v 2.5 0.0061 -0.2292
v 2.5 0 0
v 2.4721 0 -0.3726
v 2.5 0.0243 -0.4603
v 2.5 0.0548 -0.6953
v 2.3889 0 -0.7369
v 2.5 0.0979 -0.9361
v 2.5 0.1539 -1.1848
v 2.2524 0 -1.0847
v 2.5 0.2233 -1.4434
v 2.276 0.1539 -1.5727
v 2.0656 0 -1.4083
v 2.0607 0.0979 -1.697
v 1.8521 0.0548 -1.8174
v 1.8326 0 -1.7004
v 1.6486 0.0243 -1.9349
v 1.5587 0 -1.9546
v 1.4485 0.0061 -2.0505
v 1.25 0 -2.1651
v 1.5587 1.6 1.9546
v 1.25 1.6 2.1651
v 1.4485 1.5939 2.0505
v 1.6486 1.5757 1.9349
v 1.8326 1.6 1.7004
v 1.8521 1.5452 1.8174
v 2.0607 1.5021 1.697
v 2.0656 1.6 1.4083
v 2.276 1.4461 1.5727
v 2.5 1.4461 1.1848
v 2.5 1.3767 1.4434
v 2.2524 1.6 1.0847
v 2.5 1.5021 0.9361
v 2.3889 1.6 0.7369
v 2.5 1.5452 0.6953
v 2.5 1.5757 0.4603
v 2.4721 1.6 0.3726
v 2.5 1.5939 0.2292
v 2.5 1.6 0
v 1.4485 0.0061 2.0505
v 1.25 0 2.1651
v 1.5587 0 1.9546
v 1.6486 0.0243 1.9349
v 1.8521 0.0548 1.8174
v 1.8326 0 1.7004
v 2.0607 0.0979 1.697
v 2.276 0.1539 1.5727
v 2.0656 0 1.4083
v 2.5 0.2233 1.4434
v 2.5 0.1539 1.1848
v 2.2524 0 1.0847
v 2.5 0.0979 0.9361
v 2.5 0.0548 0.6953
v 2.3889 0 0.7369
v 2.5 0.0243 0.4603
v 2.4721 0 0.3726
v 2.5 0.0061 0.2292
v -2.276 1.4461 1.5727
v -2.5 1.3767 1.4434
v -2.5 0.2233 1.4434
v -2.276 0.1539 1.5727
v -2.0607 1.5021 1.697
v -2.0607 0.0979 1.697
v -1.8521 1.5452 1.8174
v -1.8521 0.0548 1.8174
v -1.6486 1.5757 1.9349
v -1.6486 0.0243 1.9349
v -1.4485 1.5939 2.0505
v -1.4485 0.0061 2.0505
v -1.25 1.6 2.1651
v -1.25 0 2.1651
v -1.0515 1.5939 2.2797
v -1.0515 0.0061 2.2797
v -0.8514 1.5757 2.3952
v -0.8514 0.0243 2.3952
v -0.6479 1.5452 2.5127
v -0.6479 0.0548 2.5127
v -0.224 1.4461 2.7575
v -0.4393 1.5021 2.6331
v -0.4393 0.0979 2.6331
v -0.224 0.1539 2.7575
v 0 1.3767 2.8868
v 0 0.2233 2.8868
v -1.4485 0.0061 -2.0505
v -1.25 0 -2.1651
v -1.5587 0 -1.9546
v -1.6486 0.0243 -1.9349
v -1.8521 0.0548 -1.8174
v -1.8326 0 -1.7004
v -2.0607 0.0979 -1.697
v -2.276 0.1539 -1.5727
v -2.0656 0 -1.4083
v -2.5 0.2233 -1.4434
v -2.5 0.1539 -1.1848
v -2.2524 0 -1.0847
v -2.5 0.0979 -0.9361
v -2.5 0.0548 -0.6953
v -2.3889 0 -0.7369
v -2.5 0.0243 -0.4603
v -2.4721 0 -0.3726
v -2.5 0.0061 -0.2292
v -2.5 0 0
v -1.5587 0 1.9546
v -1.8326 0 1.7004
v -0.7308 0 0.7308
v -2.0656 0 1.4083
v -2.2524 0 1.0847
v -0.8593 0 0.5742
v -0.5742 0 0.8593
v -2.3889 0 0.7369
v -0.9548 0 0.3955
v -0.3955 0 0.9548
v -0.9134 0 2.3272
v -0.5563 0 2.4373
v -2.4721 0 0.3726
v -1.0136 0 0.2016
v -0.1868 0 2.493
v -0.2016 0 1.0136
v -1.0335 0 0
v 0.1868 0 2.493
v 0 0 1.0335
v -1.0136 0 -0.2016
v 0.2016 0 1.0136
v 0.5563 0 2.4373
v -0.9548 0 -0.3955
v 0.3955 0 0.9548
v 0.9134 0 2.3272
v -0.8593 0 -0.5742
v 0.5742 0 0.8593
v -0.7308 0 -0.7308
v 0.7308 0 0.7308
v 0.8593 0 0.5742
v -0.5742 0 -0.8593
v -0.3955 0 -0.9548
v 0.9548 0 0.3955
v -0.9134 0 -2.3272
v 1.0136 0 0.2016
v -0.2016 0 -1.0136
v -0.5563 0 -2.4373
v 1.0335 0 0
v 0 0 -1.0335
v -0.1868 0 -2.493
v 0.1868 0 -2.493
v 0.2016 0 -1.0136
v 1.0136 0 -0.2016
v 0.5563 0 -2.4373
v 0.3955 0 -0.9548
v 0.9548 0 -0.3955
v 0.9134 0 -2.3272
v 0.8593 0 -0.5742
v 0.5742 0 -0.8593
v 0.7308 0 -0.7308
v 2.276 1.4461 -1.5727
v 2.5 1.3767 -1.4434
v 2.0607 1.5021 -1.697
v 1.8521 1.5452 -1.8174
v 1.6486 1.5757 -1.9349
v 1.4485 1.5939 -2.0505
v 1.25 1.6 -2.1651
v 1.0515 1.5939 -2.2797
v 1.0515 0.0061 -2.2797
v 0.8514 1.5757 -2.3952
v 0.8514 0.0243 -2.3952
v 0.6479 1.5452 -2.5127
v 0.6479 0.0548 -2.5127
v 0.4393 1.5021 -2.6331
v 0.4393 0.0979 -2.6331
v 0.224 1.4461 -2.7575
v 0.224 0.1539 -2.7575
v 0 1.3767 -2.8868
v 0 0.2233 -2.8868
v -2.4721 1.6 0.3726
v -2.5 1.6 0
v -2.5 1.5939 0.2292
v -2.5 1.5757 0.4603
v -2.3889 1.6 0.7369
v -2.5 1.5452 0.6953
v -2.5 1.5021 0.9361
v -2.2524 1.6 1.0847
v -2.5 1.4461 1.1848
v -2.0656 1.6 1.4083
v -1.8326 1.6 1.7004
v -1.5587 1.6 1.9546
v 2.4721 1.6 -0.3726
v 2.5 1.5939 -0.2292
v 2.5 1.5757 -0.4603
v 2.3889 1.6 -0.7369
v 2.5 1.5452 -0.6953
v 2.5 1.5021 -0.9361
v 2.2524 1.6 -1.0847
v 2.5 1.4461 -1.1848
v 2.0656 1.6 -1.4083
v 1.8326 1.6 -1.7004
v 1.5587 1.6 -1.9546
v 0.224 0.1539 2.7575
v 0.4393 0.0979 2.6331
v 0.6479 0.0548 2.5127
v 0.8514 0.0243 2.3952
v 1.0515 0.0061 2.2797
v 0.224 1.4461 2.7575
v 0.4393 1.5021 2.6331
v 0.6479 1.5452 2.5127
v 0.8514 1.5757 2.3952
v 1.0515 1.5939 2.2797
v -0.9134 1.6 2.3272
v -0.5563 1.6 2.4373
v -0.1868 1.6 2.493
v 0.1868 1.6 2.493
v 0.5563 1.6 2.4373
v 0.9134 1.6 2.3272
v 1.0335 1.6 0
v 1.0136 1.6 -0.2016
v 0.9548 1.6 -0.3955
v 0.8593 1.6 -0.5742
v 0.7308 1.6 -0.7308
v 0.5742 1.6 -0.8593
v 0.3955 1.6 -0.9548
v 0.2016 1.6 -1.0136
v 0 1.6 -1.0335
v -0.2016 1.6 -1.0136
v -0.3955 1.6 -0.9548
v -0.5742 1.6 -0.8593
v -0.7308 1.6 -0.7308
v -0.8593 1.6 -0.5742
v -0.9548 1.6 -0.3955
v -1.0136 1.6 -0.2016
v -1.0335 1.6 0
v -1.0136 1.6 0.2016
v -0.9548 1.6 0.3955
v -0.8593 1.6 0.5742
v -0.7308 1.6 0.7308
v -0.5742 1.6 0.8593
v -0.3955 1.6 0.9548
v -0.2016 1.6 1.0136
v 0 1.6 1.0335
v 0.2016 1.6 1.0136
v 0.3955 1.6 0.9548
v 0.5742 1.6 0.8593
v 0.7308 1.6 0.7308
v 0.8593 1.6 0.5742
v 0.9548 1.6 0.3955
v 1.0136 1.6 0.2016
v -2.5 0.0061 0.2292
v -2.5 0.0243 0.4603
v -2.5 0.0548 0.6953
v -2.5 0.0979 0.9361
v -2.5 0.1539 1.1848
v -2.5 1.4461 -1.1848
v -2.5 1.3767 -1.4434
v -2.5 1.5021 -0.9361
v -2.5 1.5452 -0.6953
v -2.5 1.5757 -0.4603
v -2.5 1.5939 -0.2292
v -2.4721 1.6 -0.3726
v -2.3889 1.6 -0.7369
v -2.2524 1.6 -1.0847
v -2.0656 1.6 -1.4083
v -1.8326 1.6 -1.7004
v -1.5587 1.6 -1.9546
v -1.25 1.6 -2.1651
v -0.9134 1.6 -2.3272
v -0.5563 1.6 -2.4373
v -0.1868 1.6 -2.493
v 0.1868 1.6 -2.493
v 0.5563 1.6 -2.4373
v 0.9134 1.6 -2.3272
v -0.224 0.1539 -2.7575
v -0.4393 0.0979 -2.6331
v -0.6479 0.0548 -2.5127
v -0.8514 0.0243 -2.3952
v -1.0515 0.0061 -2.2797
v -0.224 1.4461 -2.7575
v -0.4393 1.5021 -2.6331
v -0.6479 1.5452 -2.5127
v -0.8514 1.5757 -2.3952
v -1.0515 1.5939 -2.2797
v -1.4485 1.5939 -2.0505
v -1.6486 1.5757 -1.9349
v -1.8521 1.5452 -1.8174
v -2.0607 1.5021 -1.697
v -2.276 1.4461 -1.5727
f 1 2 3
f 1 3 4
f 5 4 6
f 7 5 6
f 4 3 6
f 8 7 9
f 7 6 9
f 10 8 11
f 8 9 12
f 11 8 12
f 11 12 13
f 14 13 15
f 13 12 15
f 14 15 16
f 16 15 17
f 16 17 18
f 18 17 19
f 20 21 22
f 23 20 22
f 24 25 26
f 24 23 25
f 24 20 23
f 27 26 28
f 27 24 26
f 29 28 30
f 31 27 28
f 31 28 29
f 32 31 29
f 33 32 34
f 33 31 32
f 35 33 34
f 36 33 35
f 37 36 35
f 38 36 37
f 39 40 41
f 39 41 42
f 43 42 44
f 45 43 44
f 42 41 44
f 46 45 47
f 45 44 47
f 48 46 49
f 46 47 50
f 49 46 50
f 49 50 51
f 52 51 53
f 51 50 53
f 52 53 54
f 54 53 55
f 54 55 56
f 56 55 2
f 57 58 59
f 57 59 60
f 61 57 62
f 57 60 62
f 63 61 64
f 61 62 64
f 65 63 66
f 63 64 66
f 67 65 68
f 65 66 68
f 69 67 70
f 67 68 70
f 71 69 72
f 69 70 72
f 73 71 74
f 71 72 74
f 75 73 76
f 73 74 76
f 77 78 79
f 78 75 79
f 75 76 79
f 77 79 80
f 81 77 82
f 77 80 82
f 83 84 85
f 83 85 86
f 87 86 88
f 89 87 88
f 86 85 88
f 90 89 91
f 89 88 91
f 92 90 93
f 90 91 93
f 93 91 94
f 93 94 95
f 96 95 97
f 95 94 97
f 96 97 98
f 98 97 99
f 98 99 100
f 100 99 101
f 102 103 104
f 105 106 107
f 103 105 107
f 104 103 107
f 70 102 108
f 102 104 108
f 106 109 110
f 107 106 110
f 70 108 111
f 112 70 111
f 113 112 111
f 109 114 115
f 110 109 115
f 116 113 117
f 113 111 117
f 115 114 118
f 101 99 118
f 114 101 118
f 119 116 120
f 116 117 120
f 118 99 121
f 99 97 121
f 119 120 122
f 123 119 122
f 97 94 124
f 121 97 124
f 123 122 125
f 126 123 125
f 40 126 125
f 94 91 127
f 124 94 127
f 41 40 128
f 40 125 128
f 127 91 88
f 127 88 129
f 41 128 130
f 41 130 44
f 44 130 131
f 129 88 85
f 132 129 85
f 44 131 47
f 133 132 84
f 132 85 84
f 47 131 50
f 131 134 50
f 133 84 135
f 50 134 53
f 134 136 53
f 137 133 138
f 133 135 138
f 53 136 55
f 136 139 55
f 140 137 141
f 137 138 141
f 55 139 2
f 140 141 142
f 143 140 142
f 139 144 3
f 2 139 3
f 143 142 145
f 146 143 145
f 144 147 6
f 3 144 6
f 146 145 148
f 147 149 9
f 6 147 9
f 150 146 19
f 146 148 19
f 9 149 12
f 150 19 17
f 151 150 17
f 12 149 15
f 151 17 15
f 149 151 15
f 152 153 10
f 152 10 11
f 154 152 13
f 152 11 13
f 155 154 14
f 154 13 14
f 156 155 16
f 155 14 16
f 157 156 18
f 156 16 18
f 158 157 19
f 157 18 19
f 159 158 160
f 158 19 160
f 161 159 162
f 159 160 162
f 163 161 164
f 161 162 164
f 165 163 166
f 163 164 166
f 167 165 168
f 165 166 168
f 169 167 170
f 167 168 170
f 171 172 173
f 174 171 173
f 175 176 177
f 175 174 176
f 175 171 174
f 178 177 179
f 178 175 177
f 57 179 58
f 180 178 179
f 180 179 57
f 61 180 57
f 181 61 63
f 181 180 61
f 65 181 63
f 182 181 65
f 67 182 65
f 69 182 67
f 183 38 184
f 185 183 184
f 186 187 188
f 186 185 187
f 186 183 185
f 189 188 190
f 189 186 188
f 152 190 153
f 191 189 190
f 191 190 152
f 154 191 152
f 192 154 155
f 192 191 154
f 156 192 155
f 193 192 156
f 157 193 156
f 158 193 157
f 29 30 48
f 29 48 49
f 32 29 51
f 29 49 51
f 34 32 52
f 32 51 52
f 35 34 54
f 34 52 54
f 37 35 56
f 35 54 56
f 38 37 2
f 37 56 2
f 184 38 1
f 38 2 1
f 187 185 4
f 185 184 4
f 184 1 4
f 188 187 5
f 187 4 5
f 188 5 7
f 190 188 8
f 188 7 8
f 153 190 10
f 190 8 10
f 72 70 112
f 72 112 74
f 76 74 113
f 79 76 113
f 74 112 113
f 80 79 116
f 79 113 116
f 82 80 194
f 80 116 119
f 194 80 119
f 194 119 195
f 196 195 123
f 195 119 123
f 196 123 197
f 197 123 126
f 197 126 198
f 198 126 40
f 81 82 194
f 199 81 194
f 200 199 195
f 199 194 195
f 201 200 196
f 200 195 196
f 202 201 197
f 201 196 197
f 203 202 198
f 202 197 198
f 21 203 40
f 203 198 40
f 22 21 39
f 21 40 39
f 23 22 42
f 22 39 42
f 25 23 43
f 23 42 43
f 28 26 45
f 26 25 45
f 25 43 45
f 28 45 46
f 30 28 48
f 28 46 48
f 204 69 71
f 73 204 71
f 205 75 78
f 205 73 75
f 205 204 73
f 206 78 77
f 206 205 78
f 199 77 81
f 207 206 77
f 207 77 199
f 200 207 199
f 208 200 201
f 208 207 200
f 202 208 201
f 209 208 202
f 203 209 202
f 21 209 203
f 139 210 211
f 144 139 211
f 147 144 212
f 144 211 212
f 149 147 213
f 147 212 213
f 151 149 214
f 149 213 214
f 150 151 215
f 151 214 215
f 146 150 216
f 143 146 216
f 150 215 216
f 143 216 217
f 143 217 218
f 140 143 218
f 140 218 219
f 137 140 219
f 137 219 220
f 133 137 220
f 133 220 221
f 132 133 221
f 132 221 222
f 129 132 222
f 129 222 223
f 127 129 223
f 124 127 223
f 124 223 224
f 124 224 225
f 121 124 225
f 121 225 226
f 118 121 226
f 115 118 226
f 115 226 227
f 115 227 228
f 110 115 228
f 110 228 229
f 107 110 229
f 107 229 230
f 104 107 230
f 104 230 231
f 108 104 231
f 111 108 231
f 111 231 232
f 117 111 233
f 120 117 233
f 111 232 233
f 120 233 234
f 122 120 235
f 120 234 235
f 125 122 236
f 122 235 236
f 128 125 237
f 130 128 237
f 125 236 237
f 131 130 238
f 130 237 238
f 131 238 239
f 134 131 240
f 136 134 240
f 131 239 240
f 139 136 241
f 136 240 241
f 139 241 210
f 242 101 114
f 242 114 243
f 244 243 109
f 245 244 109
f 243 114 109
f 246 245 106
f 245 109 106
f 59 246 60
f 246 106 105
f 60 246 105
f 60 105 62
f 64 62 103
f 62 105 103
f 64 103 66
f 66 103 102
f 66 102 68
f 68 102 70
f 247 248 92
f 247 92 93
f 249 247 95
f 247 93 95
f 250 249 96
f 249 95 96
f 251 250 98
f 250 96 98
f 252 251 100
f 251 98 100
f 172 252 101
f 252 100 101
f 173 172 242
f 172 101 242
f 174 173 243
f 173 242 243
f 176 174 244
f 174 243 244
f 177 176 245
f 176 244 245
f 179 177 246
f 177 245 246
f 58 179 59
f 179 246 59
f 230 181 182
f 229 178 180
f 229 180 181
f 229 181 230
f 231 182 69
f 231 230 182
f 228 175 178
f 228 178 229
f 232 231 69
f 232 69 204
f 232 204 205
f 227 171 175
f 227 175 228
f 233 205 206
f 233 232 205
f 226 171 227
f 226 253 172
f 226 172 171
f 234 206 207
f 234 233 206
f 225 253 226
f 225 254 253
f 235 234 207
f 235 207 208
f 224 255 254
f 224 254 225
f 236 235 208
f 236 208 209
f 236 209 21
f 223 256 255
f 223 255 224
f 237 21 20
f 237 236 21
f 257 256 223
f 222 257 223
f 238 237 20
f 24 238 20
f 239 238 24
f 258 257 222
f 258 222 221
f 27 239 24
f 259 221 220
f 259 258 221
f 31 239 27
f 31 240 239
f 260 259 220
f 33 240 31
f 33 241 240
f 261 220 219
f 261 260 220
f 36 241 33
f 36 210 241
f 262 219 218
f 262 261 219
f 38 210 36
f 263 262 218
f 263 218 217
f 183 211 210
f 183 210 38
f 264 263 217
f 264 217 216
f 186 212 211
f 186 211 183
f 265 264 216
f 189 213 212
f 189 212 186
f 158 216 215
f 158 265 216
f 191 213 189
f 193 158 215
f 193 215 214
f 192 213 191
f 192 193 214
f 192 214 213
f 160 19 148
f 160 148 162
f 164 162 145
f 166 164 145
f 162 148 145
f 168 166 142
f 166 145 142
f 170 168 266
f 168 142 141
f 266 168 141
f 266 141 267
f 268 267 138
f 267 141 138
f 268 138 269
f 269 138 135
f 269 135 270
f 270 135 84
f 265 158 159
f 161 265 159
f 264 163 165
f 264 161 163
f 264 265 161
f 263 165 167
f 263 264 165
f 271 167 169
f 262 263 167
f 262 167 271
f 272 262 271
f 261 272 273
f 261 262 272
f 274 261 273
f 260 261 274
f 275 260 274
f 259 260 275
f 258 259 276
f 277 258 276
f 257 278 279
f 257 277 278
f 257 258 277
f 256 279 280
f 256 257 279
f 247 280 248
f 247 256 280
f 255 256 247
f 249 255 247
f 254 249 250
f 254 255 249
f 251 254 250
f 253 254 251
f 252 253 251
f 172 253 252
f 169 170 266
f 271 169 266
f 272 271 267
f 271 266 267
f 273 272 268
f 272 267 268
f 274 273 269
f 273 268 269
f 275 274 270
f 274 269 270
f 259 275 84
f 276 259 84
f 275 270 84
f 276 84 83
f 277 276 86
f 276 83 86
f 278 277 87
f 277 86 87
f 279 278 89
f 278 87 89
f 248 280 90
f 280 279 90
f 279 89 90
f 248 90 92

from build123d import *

# Parameters (mm, degrees)
EXTRUDE_1_DEPTH    = 1.6
SKETCH_4_R         = 1.0335
CUT_EXTRUDE1_DEPTH = 10


with BuildPart() as part:
    # 草图1 → 凸台-拉伸1 (new body)
    with BuildSketch(Plane(origin=(0, 0, 0), x_dir=(1, 0, 0), z_dir=(0, 1, 0))):
        Polygon((0, 2.886751346), (-2.5, 1.443375673), (-2.5, -1.443375673), (0, -2.886751346), (2.5, -1.443375673), (2.5, 1.443375673), align=None)
    extrude(amount=EXTRUDE_1_DEPTH)

    # 草图2 → 切除-旋转1 (revolve, cut)
    with BuildSketch(Plane(origin=(0, 0, 0), x_dir=(0, 0, -1), z_dir=(1, 0, 0))):
        Polygon((2.886751346, 1.6), (2.886751346, 1.376709006), (2.5, 1.6), align=None)
    revolve(axis=Axis((0, 0, 0), (0, 1, 0)), mode=Mode.SUBTRACT)

    # 草图3 → 切除-旋转2 (revolve, cut)
    with BuildSketch(Plane(origin=(0, 0, 0), x_dir=(0, 0, -1), z_dir=(1, 0, 0))):
        Polygon((2.886751346, 0), (2.886751346, 0.223290994), (2.5, 0), align=None)
    revolve(axis=Axis((0, 0, 0), (0, 1, 0)), mode=Mode.SUBTRACT)

    # 草图4 → Cut-Extrude1 (cut)
    with BuildSketch(Plane(origin=(0, 1.6, 0), x_dir=(1, 0, 0), z_dir=(0, 1, 0))):
        Circle(SKETCH_4_R)
    extrude(amount=-CUT_EXTRUDE1_DEPTH, mode=Mode.SUBTRACT)


solid = part.part
